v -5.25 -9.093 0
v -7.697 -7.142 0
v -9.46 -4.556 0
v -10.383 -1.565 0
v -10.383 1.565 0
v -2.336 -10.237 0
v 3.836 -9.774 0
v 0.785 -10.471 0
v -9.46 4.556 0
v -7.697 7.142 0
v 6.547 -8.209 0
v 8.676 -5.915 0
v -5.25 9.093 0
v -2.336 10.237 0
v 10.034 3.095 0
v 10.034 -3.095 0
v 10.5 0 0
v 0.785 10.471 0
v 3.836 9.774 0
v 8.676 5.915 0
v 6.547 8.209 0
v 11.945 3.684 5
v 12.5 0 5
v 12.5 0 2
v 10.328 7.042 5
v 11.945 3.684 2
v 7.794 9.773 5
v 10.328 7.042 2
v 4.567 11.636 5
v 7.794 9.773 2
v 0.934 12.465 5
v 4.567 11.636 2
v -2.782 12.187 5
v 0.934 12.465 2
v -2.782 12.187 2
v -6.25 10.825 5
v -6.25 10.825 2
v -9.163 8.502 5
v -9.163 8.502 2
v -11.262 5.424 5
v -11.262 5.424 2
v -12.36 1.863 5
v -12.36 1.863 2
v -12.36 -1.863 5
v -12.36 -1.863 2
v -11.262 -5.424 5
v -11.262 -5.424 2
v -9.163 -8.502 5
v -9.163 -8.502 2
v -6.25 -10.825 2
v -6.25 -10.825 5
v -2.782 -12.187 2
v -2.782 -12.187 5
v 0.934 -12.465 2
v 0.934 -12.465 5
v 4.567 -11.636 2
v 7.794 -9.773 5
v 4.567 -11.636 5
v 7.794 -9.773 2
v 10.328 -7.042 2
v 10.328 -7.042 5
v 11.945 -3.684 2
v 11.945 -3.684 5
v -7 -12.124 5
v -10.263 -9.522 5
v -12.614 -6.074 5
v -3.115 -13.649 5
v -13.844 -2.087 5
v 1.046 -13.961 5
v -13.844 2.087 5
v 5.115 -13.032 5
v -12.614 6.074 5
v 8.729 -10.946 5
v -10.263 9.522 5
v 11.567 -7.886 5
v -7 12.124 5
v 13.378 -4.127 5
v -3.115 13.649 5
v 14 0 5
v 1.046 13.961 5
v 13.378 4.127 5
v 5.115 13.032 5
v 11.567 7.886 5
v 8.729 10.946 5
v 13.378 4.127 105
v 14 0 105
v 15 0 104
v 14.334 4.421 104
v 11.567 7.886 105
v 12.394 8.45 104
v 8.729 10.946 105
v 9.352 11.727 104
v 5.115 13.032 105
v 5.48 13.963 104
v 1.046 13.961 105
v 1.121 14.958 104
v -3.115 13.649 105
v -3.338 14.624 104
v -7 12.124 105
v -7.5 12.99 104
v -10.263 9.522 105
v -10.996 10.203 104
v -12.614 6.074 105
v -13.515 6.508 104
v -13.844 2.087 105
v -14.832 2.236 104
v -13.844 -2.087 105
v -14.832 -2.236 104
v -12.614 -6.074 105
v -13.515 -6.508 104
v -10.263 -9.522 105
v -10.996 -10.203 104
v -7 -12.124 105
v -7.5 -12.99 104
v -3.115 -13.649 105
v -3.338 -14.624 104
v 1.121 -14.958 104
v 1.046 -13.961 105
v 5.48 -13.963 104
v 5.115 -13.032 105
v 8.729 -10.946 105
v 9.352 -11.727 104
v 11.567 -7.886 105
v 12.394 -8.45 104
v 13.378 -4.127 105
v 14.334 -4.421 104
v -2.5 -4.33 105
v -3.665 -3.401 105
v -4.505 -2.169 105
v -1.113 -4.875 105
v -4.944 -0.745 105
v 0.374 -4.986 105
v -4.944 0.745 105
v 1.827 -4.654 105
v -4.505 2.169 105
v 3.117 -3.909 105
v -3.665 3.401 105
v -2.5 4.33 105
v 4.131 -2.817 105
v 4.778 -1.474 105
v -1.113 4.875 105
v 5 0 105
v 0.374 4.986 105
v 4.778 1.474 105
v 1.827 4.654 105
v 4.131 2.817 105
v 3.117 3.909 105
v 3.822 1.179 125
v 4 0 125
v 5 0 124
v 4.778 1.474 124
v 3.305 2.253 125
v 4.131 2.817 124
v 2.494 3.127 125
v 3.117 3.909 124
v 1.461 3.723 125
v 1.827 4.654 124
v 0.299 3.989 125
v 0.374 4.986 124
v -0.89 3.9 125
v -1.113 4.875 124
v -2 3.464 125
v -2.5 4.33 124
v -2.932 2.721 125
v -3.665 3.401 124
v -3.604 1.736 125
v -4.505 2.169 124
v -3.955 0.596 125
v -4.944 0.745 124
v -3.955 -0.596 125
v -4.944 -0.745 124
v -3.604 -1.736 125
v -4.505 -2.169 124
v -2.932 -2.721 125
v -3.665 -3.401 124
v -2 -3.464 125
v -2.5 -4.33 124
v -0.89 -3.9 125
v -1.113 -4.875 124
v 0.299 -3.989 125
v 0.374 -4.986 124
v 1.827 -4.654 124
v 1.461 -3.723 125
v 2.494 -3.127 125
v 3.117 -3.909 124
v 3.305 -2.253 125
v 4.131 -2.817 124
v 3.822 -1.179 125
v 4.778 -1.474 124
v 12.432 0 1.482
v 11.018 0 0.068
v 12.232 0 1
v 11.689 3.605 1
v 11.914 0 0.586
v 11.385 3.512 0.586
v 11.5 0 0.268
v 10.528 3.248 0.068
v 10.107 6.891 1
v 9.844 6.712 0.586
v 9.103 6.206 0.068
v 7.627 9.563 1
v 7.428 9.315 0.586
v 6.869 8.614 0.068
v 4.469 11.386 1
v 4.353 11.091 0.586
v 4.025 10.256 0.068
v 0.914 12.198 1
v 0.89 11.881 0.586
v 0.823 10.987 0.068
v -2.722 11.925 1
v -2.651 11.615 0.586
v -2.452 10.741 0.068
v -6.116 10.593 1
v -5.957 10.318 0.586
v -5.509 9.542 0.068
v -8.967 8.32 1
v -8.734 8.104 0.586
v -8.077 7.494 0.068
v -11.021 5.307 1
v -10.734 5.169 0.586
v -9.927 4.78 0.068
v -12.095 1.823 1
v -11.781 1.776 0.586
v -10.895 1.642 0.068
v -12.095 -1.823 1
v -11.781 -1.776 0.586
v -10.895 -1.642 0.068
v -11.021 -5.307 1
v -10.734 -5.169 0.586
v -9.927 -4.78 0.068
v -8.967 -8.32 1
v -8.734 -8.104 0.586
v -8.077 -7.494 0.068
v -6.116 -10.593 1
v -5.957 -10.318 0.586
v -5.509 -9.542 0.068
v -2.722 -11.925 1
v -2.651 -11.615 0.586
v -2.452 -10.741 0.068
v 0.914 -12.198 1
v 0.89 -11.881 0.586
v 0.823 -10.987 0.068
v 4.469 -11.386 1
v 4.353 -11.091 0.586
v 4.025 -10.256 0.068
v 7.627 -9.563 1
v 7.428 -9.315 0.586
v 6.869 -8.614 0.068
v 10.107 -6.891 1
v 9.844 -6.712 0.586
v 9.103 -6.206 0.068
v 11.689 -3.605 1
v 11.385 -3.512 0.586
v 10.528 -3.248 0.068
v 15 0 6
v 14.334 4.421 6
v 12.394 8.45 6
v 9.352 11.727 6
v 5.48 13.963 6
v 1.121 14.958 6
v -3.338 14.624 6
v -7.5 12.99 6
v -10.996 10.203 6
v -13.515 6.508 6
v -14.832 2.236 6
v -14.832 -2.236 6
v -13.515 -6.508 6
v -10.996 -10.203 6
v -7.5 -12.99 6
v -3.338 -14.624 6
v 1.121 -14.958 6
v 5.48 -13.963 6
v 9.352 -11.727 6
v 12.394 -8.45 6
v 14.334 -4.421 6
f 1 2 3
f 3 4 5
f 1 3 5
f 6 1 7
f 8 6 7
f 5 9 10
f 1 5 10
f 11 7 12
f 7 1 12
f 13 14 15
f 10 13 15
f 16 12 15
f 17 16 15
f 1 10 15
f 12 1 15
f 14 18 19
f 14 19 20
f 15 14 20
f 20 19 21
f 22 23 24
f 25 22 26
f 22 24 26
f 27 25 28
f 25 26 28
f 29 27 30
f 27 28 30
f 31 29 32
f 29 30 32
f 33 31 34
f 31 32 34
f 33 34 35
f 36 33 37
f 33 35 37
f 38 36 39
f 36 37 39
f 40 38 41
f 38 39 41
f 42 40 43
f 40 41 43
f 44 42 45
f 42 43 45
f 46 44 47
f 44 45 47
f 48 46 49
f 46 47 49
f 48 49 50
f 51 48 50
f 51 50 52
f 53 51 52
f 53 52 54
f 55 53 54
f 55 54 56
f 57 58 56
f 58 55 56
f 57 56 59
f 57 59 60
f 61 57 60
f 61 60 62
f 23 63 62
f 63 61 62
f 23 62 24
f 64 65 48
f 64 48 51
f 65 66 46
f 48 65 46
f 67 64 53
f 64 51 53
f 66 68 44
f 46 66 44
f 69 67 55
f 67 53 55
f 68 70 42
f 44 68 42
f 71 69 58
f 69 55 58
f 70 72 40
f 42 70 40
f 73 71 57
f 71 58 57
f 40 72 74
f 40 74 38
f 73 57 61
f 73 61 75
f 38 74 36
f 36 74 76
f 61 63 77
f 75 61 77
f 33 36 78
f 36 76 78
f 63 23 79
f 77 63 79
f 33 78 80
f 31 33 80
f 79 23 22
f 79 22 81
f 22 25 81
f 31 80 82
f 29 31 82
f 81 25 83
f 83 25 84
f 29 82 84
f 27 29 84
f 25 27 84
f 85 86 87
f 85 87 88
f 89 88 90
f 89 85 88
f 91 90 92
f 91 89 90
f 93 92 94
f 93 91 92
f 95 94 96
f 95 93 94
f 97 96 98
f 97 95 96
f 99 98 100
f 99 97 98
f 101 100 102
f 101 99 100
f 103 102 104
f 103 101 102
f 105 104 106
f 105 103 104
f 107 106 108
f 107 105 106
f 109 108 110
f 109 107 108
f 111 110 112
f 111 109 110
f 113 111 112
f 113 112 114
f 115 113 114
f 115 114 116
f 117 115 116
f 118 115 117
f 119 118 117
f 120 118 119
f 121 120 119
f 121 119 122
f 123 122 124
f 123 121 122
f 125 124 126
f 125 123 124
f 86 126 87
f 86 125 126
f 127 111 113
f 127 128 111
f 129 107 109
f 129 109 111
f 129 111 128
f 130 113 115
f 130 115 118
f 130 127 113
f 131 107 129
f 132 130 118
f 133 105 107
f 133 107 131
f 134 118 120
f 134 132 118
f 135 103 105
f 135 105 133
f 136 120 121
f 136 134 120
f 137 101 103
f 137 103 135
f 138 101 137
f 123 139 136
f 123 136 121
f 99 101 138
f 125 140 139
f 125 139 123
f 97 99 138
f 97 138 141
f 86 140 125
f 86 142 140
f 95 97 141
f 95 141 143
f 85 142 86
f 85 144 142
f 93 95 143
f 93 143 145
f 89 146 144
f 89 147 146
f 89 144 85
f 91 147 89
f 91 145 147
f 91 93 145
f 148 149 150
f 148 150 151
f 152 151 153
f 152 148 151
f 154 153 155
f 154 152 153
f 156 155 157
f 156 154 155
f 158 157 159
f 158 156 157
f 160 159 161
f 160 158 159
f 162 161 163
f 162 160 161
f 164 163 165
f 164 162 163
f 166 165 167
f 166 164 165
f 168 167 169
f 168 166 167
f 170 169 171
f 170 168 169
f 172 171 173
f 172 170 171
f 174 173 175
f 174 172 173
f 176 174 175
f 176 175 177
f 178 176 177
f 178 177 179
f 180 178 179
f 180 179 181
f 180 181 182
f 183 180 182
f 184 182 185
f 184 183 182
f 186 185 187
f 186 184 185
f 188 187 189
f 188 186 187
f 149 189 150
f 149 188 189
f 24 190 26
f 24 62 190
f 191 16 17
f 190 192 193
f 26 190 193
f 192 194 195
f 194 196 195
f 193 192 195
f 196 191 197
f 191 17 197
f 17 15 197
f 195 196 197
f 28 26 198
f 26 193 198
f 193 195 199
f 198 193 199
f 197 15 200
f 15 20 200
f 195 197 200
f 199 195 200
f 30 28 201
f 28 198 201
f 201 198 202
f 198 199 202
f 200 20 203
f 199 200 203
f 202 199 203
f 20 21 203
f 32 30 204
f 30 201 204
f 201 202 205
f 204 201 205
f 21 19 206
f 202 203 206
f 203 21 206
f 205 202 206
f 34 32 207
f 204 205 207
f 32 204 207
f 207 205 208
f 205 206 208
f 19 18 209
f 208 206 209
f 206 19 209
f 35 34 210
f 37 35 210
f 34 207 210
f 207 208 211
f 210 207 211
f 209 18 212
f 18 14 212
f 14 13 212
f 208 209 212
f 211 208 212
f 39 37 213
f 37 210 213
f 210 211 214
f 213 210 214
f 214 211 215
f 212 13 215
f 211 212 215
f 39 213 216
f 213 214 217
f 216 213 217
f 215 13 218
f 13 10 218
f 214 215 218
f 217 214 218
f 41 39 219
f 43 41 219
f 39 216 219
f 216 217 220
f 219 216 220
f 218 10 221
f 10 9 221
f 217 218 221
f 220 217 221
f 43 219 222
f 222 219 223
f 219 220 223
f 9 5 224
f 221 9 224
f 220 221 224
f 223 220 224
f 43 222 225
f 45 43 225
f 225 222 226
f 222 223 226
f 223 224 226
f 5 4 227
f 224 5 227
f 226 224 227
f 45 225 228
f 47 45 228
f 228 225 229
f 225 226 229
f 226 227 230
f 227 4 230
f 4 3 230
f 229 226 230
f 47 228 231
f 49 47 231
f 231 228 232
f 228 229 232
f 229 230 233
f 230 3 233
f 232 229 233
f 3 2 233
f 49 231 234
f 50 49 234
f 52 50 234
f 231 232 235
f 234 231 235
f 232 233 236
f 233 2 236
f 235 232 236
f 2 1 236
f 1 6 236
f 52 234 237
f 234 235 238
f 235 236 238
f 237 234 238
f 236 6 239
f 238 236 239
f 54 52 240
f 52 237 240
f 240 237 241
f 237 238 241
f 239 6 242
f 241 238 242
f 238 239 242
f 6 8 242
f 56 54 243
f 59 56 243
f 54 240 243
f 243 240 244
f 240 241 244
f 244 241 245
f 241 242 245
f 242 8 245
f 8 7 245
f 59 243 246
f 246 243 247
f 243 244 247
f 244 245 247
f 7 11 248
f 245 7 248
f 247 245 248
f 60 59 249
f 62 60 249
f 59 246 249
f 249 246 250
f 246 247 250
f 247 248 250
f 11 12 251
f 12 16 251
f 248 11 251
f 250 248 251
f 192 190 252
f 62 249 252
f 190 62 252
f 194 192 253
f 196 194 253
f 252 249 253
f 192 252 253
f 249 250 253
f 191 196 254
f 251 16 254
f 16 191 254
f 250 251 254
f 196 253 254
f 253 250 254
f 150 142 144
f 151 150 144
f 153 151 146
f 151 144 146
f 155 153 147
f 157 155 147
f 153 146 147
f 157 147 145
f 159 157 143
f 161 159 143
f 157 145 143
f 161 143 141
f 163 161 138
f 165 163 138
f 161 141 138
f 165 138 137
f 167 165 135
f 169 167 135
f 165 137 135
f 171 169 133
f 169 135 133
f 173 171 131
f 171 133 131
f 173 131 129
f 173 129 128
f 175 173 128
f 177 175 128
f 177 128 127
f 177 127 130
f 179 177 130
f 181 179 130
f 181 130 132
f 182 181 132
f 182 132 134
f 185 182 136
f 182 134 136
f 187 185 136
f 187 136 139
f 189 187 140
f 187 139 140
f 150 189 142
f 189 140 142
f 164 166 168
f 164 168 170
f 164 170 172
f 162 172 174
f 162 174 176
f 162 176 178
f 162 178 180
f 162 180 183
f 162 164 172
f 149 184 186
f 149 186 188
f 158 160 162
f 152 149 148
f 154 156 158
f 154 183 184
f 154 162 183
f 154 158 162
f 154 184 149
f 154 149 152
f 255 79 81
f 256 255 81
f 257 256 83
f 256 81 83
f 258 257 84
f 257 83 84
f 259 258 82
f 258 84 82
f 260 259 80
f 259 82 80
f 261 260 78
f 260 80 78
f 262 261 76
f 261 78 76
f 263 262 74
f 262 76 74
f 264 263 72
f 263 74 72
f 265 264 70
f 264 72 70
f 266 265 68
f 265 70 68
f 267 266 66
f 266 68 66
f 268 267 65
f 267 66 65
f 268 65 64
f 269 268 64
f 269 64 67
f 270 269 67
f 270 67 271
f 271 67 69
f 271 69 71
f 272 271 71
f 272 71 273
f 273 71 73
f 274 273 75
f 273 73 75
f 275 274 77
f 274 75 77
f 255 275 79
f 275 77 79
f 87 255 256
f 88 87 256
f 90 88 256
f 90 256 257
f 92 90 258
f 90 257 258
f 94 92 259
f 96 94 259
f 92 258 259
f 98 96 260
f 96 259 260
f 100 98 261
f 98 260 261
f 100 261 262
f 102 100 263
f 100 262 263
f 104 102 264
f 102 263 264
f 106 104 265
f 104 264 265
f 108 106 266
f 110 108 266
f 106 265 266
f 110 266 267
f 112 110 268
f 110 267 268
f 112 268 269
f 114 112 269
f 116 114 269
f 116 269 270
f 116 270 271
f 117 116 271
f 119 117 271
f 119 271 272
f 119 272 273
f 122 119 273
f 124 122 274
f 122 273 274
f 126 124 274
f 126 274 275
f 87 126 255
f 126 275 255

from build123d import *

# Parameters (mm, degrees)
F0_R     = 12.5
F1_DEPTH = 20
F3_R     = 15
F4_DEPTH = 100
F5_SIZE  = 1
F6_SIZE  = 1
F7_R     = 5
F8_DEPTH = 20
F9_SIZE  = 1
F10_R    = 2


with BuildPart() as f1:
    # F0 (on Top) → F1 (new body)
    with BuildSketch(Plane.XY):
        Circle(F0_R)
    extrude(amount=F1_DEPTH)

    # F3 (on offset) → F4 (join)
    with BuildSketch(Plane.XY.offset(5)):
        Circle(F3_R)
    extrude(amount=F4_DEPTH)

    # F5
    f5_edges = [f1.edges().sort_by_distance(p)[0] for p in [
        (-15, 0, 5),
    ]]
    chamfer(f5_edges, length=F5_SIZE)

    # F6
    f6_edges = [f1.edges().sort_by_distance(p)[0] for p in [
        (-15, 0, 105),
    ]]
    chamfer(f6_edges, length=F6_SIZE)

    # F7 (on face) → F8 (join)
    with BuildSketch(Plane.XY.offset(105)):
        Circle(F7_R)
    extrude(amount=F8_DEPTH)

    # F9
    f9_edges = [f1.edges().sort_by_distance(p)[0] for p in [
        (-5, 0, 125),
    ]]
    chamfer(f9_edges, length=F9_SIZE)

    # F10
    f10_edges = [f1.edges().sort_by_distance(p)[0] for p in [
        (-12.5, 0, 0),
    ]]
    fillet(f10_edges, radius=F10_R)


solid = f1.part
